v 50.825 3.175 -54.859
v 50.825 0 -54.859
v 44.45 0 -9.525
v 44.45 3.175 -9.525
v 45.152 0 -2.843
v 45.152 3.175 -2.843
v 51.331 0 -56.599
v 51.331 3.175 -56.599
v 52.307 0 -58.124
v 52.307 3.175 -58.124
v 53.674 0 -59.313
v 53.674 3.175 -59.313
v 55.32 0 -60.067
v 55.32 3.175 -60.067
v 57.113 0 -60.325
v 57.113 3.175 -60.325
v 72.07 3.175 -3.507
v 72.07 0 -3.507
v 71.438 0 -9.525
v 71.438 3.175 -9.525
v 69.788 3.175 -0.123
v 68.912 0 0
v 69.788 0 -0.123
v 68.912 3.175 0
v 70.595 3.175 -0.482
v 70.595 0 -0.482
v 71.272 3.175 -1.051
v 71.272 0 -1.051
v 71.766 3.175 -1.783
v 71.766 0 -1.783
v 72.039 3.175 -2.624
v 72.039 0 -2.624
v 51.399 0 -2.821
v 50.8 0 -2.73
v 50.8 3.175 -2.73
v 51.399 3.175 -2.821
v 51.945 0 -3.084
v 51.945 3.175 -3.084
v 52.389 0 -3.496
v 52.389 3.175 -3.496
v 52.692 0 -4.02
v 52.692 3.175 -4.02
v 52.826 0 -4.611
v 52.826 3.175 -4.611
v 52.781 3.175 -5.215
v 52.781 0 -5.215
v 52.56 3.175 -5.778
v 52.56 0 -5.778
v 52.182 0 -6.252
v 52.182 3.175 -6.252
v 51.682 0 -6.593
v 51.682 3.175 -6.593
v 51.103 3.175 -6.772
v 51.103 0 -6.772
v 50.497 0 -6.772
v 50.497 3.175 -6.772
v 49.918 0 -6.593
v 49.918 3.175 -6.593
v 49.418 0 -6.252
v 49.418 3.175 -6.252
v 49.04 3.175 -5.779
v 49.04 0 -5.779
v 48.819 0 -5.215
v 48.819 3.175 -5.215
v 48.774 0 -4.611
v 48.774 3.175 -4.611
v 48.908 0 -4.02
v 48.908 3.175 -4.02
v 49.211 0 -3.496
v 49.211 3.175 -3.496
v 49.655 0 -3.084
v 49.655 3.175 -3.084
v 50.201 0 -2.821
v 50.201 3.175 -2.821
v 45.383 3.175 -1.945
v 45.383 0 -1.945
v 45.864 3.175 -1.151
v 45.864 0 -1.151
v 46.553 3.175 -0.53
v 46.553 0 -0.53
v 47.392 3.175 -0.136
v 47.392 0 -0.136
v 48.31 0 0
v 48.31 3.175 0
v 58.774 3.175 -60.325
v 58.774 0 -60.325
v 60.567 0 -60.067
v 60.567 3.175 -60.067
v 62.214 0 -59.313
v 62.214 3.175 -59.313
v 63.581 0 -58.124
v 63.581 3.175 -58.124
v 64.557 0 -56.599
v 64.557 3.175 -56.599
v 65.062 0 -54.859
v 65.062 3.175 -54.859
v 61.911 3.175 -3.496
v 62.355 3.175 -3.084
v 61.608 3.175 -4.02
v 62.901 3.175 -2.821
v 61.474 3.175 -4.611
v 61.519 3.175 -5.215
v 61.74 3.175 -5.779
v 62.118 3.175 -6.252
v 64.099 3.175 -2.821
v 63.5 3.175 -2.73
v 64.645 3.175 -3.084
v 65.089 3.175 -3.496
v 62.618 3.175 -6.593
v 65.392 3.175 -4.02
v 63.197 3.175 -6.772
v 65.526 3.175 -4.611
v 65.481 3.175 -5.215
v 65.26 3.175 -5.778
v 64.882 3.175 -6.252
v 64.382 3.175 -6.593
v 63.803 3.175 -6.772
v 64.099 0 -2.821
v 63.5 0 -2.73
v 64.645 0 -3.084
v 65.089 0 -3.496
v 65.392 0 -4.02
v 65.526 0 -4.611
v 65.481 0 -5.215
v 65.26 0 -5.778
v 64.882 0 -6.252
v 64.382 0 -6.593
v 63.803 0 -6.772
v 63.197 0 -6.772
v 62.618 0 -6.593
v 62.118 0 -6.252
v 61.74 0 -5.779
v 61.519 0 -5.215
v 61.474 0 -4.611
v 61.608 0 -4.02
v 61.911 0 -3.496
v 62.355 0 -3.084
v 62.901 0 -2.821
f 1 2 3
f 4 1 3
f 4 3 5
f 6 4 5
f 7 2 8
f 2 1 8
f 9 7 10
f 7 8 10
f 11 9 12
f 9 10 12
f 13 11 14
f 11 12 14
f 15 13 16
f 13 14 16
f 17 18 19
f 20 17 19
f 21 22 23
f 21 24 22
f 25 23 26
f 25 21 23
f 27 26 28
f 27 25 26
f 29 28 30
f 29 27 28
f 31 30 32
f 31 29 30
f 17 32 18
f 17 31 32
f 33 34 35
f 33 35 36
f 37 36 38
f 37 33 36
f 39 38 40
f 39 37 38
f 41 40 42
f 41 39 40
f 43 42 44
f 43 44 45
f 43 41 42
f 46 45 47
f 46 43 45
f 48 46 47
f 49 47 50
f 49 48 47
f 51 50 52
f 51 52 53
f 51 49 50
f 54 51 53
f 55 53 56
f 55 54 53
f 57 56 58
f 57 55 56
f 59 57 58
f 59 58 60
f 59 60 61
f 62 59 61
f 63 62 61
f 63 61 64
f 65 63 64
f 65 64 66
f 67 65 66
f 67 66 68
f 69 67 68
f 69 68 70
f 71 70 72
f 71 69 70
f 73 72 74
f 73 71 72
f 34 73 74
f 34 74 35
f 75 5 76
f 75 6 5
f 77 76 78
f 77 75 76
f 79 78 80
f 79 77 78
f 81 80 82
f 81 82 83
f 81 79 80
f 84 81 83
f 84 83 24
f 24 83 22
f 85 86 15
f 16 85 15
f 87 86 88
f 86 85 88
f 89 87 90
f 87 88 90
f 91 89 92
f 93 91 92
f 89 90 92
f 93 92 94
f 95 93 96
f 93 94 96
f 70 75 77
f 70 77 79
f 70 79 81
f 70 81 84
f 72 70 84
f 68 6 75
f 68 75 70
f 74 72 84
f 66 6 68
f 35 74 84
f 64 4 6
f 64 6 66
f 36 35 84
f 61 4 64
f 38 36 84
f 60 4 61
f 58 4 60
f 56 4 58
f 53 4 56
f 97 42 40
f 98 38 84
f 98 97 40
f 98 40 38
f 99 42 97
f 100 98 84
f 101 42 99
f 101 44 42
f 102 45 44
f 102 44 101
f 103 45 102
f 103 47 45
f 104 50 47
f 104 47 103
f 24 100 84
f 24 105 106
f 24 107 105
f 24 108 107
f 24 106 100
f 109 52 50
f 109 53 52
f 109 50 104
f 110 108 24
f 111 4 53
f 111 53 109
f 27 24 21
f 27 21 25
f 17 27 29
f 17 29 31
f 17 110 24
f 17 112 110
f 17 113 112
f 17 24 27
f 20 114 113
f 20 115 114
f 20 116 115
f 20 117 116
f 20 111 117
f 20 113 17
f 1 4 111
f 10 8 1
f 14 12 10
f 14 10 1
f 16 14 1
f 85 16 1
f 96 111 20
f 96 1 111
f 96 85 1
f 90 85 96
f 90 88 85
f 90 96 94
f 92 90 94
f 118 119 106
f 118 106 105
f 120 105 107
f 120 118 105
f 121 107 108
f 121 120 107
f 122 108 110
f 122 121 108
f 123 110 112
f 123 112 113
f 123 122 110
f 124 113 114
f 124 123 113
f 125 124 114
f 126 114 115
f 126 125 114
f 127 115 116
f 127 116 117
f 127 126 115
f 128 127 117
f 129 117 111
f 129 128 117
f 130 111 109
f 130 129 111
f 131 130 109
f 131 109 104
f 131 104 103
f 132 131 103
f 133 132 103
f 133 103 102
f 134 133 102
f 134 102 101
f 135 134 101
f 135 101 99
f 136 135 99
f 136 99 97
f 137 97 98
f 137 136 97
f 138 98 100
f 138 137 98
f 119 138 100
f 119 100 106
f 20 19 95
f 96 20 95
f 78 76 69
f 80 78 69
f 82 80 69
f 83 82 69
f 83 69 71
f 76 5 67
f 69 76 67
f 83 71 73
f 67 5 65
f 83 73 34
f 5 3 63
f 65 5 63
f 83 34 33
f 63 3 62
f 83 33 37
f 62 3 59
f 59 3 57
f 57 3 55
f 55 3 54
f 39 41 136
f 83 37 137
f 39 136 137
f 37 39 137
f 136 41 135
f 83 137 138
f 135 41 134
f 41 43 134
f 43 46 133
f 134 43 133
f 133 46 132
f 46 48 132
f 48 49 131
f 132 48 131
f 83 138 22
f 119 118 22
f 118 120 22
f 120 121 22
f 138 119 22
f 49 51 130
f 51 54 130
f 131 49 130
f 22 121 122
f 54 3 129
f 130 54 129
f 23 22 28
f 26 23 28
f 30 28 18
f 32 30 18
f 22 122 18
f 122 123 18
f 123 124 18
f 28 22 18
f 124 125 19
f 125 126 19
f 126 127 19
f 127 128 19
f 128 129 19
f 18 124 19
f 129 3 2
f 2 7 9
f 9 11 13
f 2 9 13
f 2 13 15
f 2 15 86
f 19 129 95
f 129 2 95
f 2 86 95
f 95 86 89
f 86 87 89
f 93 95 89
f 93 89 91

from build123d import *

# Parameters (mm, degrees)
SKETCH1_R           = 2.032
BOSS_EXTRUDE1_DEPTH = 3.175
FILLET1_R           = 6.35
FILLET2_R           = 3.175


with BuildPart() as part:
    # Sketch1 → Boss-Extrude1 (new body)
    with BuildSketch(Plane(origin=(0, 0, 0), x_dir=(1, 0, 0), z_dir=(0, 1, 0))):
        Polygon((44.45, 9.525), (45.451117841, 0), (72.438617841, 0), (71.4375, 9.525), (64.29375, 60.325), (51.59375, 60.325), align=None)
        with Locations(Location((50.8, 4.7625, 0), (0, 0, 270))):
            Circle(SKETCH1_R, mode=Mode.SUBTRACT)
        with Locations(Location((63.5, 4.7625, 0), (0, 0, 270))):
            Circle(SKETCH1_R, mode=Mode.SUBTRACT)
    extrude(amount=BOSS_EXTRUDE1_DEPTH)

    # Fillet1
    fillet1_edges = [part.edges().sort_by_distance(p)[0] for p in [
        (51.59375, 1.5875, -60.325),
        (64.29375, 1.5875, -60.325),
    ]]
    fillet(fillet1_edges, radius=FILLET1_R)

    # Fillet2
    fillet2_edges = [part.edges().sort_by_distance(p)[0] for p in [
        (72.438617841, 1.5875, 0),
        (45.451117841, 1.5875, 0),
    ]]
    fillet(fillet2_edges, radius=FILLET2_R)


solid = part.part
